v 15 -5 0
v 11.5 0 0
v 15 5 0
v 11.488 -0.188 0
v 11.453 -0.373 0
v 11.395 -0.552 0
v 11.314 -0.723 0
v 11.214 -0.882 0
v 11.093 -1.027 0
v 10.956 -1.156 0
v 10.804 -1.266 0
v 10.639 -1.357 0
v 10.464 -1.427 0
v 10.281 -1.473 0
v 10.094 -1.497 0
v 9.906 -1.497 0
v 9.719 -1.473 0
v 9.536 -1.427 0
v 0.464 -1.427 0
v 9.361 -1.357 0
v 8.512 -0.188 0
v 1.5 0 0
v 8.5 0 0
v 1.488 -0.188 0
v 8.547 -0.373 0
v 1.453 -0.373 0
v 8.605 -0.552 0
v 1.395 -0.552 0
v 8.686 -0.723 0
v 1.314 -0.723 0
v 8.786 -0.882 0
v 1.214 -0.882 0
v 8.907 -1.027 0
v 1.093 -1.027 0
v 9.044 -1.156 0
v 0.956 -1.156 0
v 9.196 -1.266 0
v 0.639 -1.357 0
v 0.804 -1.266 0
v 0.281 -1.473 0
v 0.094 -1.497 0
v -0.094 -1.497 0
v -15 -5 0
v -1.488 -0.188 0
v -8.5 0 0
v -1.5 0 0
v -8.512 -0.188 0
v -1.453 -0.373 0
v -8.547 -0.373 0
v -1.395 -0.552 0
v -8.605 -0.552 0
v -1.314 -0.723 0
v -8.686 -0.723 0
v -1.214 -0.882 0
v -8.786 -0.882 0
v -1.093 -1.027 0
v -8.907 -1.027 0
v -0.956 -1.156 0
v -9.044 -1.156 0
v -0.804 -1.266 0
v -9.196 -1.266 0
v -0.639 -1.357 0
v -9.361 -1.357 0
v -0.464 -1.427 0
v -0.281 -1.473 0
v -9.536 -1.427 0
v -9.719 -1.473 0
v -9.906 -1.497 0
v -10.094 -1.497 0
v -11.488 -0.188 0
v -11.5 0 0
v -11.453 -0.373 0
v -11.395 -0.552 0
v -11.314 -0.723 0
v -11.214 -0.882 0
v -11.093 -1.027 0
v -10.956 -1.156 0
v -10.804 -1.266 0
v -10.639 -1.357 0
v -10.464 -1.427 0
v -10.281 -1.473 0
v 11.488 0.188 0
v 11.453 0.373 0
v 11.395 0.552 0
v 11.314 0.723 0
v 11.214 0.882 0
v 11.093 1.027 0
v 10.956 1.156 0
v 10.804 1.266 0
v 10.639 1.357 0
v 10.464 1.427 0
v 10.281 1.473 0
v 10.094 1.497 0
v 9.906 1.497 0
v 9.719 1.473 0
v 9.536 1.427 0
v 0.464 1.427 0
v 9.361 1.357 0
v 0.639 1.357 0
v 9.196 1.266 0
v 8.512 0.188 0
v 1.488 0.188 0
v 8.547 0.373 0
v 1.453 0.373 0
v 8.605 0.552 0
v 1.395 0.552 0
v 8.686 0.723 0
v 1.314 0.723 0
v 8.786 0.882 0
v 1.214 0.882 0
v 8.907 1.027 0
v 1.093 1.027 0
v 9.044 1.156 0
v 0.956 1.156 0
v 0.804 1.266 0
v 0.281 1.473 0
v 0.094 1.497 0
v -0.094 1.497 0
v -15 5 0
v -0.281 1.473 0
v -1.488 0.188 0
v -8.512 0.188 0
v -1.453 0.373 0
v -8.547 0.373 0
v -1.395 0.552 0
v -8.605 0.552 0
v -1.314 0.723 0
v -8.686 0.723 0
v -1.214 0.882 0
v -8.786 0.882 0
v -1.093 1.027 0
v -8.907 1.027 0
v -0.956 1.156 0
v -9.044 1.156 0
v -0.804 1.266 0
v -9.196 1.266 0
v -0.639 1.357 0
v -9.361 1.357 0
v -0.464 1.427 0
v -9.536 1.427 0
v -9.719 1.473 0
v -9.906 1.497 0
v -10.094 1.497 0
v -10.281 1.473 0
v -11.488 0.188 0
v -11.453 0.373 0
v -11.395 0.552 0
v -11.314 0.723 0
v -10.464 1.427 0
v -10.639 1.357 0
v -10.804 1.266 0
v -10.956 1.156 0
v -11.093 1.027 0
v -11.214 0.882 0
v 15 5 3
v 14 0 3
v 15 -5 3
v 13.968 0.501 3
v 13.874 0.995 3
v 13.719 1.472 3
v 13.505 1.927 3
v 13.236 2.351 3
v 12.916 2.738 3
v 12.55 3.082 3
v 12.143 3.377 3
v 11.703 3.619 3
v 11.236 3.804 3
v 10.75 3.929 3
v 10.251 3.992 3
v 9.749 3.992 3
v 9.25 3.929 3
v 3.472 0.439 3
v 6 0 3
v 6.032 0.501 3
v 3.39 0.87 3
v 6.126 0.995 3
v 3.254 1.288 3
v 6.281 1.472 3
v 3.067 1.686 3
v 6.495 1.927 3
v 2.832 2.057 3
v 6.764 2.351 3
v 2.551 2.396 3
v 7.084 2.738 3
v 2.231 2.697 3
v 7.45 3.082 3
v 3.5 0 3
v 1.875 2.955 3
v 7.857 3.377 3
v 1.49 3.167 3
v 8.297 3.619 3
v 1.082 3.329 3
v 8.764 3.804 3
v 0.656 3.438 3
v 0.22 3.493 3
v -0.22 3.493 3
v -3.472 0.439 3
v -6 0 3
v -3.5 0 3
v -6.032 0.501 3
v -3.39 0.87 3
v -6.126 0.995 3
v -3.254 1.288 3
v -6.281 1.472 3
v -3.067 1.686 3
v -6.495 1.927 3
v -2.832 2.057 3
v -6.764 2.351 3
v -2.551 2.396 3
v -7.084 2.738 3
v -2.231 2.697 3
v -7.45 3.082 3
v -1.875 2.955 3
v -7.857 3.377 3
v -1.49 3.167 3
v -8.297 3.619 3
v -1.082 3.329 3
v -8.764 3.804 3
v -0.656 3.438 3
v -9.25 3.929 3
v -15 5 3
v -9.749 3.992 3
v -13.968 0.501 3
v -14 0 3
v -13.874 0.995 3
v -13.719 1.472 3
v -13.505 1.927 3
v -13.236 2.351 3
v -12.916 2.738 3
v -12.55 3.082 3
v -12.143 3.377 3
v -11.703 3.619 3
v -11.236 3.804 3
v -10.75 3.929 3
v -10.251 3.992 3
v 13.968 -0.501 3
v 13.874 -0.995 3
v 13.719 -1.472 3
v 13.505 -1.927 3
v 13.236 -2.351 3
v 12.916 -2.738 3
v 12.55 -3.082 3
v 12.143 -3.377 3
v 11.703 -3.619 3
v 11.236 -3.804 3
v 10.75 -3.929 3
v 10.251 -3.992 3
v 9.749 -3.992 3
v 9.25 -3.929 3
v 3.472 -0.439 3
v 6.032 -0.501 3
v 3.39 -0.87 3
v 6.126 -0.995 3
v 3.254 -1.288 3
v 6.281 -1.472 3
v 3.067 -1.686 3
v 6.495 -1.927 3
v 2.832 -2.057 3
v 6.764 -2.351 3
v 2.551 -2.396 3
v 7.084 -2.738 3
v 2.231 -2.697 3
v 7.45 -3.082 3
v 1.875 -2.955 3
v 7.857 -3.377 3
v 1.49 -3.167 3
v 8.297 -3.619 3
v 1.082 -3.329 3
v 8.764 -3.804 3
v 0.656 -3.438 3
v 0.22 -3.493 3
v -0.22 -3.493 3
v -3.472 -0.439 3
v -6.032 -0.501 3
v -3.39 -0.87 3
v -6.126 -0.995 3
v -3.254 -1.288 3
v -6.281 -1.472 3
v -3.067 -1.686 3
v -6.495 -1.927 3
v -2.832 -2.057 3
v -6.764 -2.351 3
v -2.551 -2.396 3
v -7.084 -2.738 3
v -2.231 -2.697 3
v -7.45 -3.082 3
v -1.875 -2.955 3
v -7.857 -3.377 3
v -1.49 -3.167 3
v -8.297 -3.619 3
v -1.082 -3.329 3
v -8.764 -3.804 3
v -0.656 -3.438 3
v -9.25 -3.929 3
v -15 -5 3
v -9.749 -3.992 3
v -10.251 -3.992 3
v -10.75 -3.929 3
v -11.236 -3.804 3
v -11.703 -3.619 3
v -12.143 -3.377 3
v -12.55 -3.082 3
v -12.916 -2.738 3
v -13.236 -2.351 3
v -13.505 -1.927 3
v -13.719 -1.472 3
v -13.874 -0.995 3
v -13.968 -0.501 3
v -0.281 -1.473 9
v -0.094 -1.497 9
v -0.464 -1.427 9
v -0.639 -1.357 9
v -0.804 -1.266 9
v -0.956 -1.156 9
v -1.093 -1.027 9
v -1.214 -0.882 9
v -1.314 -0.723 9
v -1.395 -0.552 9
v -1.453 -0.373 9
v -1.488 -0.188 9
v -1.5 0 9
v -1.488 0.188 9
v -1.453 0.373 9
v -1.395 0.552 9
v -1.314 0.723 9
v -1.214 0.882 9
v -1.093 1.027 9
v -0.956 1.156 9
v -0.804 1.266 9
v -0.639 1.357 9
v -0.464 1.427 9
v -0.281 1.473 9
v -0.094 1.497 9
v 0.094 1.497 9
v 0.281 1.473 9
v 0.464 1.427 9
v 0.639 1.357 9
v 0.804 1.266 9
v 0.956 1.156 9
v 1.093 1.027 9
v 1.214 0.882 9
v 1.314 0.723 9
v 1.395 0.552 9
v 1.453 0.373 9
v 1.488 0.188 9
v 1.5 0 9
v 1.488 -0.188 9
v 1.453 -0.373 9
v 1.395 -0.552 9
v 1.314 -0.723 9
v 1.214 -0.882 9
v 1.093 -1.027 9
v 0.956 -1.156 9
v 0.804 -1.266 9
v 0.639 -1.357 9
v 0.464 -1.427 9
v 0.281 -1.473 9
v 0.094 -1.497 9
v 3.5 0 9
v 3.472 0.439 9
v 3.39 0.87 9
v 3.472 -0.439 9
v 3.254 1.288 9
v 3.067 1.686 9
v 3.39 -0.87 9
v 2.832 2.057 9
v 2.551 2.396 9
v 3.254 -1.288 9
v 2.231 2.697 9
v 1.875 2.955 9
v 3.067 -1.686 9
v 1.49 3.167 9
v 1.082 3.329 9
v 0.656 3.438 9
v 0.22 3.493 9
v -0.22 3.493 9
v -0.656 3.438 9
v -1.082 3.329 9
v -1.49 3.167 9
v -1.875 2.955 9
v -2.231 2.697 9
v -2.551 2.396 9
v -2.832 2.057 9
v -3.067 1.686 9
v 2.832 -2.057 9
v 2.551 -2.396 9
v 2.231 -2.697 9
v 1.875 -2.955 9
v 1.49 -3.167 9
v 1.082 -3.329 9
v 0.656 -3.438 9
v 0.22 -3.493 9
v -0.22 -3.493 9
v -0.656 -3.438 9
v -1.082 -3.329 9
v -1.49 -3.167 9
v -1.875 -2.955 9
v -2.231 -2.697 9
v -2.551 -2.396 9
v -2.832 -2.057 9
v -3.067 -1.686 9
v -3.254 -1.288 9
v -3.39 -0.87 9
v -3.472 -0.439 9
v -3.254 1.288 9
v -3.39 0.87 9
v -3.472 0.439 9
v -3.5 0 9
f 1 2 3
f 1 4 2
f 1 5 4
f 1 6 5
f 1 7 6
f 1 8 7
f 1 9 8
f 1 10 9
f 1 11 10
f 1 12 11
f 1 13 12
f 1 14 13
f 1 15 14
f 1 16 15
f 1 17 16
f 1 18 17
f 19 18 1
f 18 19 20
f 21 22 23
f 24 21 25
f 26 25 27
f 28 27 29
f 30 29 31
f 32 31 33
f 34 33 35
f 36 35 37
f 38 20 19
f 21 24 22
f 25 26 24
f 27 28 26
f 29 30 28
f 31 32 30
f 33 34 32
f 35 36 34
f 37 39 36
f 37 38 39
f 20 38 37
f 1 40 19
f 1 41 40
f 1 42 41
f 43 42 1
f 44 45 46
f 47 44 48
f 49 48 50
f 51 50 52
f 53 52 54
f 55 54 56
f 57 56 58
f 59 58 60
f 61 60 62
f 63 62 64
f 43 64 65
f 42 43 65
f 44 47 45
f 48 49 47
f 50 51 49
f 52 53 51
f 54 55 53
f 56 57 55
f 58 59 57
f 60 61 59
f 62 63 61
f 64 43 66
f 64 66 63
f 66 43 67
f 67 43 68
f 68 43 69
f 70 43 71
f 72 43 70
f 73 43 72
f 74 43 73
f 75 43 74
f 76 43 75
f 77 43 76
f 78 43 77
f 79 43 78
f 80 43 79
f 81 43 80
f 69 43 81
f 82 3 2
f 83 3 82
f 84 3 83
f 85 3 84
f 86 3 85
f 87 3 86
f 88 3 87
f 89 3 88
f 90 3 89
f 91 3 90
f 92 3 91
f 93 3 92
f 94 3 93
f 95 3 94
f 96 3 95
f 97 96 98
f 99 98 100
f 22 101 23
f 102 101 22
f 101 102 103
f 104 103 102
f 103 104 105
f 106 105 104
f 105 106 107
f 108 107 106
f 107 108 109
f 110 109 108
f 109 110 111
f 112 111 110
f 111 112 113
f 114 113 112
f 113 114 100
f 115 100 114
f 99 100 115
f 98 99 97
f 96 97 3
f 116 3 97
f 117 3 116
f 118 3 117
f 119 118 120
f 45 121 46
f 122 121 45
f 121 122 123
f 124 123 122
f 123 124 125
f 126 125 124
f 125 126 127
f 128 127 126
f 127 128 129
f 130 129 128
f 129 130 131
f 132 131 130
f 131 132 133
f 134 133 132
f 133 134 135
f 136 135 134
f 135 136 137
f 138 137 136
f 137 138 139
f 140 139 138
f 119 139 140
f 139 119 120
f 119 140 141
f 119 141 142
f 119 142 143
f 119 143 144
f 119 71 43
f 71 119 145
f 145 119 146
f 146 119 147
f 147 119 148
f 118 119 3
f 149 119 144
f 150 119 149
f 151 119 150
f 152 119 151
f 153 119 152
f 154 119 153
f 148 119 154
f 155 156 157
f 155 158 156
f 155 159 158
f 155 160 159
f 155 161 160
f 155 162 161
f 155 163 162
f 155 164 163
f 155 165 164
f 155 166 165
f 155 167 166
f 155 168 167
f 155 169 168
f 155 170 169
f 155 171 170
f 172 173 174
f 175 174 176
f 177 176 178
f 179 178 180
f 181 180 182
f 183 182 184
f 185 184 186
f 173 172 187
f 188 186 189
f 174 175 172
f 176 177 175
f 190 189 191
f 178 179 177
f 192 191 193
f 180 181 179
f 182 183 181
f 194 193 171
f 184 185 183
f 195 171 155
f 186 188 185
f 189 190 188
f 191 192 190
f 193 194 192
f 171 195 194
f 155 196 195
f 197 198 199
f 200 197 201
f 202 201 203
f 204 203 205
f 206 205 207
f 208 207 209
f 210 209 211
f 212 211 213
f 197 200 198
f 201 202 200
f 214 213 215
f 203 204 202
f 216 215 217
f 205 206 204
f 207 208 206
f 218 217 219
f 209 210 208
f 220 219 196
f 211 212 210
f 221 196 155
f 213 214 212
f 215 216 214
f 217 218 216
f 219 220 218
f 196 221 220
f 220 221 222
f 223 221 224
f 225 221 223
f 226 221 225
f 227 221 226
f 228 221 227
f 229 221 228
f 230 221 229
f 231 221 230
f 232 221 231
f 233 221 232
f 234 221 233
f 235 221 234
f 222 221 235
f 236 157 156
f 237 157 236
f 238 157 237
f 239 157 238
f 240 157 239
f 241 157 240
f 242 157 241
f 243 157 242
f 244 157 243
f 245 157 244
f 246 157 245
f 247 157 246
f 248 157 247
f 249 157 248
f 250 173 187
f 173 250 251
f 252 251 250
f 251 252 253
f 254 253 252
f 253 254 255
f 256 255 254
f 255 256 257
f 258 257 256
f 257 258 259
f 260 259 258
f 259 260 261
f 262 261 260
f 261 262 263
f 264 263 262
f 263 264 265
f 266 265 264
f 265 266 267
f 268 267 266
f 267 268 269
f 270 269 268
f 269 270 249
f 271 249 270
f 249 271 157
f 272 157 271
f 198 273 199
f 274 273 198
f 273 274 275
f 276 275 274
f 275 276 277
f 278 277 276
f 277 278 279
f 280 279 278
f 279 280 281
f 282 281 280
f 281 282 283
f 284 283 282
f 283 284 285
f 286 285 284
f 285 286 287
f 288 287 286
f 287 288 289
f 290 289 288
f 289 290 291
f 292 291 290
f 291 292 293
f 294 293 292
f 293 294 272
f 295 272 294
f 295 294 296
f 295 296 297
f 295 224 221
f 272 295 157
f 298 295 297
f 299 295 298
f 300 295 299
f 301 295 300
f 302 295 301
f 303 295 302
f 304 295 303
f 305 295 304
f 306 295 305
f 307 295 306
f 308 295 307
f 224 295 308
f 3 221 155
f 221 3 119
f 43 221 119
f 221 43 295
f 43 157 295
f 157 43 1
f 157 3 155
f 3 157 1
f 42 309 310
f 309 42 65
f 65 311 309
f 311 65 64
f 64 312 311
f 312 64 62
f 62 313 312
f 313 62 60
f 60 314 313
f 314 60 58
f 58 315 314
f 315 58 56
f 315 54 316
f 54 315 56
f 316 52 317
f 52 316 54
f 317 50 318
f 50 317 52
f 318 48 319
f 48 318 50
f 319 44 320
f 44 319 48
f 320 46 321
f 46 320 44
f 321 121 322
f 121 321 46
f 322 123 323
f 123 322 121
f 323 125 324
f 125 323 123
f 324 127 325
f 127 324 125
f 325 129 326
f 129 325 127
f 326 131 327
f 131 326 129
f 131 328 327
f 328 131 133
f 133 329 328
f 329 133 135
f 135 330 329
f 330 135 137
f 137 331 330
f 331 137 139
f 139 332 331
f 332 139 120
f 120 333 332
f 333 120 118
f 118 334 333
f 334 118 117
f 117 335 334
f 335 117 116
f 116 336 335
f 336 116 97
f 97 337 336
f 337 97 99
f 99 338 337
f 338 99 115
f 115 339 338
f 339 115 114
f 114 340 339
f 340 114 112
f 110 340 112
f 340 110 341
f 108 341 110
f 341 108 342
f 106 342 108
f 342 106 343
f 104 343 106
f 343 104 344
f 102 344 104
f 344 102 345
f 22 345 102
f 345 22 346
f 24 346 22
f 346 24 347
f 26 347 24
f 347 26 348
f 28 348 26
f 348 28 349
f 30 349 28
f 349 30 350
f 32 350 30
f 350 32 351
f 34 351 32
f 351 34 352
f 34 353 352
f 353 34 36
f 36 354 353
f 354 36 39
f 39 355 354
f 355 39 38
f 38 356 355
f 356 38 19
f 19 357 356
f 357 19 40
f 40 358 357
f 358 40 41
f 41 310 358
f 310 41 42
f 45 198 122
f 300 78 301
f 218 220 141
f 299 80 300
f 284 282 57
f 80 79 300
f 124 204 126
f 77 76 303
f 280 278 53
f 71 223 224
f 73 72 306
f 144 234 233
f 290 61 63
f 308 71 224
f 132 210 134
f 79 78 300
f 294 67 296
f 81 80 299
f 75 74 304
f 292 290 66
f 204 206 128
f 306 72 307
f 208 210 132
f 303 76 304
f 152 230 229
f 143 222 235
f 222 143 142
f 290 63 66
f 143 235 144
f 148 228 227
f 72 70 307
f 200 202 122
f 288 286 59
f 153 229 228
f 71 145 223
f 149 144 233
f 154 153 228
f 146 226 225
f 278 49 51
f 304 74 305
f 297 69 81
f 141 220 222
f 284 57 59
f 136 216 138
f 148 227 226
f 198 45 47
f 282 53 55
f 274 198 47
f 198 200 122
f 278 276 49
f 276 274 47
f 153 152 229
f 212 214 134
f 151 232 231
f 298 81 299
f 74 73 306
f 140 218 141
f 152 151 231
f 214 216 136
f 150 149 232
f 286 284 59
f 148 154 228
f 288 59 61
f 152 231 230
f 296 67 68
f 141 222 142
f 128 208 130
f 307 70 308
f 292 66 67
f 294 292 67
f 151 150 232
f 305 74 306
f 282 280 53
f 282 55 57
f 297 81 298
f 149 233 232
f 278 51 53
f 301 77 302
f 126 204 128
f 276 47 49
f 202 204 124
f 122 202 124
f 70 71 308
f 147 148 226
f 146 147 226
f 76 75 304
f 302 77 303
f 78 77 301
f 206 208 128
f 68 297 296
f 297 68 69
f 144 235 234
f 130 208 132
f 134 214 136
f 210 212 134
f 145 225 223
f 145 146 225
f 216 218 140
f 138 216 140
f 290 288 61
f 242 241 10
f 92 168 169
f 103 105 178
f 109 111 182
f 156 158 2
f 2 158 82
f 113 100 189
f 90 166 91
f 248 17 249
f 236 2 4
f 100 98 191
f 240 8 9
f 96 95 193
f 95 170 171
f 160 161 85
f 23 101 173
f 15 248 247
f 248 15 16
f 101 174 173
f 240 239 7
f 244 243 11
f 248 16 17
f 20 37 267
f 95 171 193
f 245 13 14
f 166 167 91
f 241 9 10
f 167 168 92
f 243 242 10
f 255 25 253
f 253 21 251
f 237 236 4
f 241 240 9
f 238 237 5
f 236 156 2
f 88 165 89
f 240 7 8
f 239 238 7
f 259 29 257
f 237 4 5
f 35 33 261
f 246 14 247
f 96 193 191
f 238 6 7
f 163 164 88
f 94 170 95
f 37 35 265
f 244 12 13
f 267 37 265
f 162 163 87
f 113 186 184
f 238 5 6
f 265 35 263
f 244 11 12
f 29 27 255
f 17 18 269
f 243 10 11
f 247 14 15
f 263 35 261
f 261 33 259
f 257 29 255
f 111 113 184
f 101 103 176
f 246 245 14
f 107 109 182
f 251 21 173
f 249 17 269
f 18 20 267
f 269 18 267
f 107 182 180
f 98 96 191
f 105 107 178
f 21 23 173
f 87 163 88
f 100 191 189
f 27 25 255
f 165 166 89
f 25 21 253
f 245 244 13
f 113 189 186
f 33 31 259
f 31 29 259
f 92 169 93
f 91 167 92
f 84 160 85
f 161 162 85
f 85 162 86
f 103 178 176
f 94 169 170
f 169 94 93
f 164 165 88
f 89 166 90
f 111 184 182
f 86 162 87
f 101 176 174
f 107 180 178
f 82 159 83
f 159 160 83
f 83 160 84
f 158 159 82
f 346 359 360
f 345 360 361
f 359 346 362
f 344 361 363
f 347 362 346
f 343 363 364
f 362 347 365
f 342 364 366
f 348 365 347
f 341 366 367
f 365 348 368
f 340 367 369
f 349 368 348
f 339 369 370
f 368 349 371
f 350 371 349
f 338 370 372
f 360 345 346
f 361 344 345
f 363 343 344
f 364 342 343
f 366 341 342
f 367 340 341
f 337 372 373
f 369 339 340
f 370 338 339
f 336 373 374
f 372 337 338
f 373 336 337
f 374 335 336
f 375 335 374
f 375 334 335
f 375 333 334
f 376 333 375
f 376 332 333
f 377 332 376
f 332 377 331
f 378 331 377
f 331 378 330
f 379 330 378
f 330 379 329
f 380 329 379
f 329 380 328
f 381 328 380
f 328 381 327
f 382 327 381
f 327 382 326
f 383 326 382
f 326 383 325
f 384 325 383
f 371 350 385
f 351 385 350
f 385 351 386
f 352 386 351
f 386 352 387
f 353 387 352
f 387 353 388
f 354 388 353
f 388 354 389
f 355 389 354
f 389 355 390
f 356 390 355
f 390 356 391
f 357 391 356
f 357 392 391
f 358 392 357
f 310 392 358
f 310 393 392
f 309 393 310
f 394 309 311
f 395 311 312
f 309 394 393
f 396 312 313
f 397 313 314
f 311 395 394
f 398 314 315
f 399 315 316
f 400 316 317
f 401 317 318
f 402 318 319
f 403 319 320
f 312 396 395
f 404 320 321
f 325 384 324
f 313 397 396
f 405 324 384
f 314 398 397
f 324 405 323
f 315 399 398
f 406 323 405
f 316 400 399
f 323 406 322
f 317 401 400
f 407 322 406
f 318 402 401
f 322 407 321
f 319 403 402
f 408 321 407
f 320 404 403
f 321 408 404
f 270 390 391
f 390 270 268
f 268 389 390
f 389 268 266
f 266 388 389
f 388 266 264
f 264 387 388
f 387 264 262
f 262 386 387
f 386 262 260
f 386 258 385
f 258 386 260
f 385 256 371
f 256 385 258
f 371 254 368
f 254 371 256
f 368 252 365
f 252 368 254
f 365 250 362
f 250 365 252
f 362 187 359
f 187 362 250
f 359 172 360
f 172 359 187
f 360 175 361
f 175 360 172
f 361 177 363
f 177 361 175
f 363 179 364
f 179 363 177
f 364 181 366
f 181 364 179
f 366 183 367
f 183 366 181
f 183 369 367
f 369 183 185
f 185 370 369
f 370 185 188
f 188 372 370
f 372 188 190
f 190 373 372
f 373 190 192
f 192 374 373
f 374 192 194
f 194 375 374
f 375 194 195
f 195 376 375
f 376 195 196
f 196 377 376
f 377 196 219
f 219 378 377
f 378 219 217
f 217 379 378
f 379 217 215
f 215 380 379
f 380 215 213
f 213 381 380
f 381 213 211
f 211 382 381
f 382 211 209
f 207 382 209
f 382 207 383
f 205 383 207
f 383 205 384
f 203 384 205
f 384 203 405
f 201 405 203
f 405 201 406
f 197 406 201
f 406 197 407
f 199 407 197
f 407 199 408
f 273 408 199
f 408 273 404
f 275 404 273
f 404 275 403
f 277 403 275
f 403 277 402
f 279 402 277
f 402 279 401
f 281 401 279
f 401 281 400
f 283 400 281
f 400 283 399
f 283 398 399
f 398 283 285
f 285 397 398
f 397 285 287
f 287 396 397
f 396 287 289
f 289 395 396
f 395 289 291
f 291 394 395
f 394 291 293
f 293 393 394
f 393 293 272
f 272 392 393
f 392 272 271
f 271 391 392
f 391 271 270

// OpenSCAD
$fn = 50;

linear_extrude(height=9)
difference() {
    circle(d=7);
    circle(d=3);
};

difference() {
    linear_extrude(height=3)
    difference() {
        square([30, 10], center=true);
        circle(d=3);
    };
    
    translate([-10, 0, 3/2])
    cylinder(h=3, d1=3, d2=8, center=true);
    
    translate([10, 0, 3/2])
    cylinder(h=3, d1=3, d2=8, center=true);
}
